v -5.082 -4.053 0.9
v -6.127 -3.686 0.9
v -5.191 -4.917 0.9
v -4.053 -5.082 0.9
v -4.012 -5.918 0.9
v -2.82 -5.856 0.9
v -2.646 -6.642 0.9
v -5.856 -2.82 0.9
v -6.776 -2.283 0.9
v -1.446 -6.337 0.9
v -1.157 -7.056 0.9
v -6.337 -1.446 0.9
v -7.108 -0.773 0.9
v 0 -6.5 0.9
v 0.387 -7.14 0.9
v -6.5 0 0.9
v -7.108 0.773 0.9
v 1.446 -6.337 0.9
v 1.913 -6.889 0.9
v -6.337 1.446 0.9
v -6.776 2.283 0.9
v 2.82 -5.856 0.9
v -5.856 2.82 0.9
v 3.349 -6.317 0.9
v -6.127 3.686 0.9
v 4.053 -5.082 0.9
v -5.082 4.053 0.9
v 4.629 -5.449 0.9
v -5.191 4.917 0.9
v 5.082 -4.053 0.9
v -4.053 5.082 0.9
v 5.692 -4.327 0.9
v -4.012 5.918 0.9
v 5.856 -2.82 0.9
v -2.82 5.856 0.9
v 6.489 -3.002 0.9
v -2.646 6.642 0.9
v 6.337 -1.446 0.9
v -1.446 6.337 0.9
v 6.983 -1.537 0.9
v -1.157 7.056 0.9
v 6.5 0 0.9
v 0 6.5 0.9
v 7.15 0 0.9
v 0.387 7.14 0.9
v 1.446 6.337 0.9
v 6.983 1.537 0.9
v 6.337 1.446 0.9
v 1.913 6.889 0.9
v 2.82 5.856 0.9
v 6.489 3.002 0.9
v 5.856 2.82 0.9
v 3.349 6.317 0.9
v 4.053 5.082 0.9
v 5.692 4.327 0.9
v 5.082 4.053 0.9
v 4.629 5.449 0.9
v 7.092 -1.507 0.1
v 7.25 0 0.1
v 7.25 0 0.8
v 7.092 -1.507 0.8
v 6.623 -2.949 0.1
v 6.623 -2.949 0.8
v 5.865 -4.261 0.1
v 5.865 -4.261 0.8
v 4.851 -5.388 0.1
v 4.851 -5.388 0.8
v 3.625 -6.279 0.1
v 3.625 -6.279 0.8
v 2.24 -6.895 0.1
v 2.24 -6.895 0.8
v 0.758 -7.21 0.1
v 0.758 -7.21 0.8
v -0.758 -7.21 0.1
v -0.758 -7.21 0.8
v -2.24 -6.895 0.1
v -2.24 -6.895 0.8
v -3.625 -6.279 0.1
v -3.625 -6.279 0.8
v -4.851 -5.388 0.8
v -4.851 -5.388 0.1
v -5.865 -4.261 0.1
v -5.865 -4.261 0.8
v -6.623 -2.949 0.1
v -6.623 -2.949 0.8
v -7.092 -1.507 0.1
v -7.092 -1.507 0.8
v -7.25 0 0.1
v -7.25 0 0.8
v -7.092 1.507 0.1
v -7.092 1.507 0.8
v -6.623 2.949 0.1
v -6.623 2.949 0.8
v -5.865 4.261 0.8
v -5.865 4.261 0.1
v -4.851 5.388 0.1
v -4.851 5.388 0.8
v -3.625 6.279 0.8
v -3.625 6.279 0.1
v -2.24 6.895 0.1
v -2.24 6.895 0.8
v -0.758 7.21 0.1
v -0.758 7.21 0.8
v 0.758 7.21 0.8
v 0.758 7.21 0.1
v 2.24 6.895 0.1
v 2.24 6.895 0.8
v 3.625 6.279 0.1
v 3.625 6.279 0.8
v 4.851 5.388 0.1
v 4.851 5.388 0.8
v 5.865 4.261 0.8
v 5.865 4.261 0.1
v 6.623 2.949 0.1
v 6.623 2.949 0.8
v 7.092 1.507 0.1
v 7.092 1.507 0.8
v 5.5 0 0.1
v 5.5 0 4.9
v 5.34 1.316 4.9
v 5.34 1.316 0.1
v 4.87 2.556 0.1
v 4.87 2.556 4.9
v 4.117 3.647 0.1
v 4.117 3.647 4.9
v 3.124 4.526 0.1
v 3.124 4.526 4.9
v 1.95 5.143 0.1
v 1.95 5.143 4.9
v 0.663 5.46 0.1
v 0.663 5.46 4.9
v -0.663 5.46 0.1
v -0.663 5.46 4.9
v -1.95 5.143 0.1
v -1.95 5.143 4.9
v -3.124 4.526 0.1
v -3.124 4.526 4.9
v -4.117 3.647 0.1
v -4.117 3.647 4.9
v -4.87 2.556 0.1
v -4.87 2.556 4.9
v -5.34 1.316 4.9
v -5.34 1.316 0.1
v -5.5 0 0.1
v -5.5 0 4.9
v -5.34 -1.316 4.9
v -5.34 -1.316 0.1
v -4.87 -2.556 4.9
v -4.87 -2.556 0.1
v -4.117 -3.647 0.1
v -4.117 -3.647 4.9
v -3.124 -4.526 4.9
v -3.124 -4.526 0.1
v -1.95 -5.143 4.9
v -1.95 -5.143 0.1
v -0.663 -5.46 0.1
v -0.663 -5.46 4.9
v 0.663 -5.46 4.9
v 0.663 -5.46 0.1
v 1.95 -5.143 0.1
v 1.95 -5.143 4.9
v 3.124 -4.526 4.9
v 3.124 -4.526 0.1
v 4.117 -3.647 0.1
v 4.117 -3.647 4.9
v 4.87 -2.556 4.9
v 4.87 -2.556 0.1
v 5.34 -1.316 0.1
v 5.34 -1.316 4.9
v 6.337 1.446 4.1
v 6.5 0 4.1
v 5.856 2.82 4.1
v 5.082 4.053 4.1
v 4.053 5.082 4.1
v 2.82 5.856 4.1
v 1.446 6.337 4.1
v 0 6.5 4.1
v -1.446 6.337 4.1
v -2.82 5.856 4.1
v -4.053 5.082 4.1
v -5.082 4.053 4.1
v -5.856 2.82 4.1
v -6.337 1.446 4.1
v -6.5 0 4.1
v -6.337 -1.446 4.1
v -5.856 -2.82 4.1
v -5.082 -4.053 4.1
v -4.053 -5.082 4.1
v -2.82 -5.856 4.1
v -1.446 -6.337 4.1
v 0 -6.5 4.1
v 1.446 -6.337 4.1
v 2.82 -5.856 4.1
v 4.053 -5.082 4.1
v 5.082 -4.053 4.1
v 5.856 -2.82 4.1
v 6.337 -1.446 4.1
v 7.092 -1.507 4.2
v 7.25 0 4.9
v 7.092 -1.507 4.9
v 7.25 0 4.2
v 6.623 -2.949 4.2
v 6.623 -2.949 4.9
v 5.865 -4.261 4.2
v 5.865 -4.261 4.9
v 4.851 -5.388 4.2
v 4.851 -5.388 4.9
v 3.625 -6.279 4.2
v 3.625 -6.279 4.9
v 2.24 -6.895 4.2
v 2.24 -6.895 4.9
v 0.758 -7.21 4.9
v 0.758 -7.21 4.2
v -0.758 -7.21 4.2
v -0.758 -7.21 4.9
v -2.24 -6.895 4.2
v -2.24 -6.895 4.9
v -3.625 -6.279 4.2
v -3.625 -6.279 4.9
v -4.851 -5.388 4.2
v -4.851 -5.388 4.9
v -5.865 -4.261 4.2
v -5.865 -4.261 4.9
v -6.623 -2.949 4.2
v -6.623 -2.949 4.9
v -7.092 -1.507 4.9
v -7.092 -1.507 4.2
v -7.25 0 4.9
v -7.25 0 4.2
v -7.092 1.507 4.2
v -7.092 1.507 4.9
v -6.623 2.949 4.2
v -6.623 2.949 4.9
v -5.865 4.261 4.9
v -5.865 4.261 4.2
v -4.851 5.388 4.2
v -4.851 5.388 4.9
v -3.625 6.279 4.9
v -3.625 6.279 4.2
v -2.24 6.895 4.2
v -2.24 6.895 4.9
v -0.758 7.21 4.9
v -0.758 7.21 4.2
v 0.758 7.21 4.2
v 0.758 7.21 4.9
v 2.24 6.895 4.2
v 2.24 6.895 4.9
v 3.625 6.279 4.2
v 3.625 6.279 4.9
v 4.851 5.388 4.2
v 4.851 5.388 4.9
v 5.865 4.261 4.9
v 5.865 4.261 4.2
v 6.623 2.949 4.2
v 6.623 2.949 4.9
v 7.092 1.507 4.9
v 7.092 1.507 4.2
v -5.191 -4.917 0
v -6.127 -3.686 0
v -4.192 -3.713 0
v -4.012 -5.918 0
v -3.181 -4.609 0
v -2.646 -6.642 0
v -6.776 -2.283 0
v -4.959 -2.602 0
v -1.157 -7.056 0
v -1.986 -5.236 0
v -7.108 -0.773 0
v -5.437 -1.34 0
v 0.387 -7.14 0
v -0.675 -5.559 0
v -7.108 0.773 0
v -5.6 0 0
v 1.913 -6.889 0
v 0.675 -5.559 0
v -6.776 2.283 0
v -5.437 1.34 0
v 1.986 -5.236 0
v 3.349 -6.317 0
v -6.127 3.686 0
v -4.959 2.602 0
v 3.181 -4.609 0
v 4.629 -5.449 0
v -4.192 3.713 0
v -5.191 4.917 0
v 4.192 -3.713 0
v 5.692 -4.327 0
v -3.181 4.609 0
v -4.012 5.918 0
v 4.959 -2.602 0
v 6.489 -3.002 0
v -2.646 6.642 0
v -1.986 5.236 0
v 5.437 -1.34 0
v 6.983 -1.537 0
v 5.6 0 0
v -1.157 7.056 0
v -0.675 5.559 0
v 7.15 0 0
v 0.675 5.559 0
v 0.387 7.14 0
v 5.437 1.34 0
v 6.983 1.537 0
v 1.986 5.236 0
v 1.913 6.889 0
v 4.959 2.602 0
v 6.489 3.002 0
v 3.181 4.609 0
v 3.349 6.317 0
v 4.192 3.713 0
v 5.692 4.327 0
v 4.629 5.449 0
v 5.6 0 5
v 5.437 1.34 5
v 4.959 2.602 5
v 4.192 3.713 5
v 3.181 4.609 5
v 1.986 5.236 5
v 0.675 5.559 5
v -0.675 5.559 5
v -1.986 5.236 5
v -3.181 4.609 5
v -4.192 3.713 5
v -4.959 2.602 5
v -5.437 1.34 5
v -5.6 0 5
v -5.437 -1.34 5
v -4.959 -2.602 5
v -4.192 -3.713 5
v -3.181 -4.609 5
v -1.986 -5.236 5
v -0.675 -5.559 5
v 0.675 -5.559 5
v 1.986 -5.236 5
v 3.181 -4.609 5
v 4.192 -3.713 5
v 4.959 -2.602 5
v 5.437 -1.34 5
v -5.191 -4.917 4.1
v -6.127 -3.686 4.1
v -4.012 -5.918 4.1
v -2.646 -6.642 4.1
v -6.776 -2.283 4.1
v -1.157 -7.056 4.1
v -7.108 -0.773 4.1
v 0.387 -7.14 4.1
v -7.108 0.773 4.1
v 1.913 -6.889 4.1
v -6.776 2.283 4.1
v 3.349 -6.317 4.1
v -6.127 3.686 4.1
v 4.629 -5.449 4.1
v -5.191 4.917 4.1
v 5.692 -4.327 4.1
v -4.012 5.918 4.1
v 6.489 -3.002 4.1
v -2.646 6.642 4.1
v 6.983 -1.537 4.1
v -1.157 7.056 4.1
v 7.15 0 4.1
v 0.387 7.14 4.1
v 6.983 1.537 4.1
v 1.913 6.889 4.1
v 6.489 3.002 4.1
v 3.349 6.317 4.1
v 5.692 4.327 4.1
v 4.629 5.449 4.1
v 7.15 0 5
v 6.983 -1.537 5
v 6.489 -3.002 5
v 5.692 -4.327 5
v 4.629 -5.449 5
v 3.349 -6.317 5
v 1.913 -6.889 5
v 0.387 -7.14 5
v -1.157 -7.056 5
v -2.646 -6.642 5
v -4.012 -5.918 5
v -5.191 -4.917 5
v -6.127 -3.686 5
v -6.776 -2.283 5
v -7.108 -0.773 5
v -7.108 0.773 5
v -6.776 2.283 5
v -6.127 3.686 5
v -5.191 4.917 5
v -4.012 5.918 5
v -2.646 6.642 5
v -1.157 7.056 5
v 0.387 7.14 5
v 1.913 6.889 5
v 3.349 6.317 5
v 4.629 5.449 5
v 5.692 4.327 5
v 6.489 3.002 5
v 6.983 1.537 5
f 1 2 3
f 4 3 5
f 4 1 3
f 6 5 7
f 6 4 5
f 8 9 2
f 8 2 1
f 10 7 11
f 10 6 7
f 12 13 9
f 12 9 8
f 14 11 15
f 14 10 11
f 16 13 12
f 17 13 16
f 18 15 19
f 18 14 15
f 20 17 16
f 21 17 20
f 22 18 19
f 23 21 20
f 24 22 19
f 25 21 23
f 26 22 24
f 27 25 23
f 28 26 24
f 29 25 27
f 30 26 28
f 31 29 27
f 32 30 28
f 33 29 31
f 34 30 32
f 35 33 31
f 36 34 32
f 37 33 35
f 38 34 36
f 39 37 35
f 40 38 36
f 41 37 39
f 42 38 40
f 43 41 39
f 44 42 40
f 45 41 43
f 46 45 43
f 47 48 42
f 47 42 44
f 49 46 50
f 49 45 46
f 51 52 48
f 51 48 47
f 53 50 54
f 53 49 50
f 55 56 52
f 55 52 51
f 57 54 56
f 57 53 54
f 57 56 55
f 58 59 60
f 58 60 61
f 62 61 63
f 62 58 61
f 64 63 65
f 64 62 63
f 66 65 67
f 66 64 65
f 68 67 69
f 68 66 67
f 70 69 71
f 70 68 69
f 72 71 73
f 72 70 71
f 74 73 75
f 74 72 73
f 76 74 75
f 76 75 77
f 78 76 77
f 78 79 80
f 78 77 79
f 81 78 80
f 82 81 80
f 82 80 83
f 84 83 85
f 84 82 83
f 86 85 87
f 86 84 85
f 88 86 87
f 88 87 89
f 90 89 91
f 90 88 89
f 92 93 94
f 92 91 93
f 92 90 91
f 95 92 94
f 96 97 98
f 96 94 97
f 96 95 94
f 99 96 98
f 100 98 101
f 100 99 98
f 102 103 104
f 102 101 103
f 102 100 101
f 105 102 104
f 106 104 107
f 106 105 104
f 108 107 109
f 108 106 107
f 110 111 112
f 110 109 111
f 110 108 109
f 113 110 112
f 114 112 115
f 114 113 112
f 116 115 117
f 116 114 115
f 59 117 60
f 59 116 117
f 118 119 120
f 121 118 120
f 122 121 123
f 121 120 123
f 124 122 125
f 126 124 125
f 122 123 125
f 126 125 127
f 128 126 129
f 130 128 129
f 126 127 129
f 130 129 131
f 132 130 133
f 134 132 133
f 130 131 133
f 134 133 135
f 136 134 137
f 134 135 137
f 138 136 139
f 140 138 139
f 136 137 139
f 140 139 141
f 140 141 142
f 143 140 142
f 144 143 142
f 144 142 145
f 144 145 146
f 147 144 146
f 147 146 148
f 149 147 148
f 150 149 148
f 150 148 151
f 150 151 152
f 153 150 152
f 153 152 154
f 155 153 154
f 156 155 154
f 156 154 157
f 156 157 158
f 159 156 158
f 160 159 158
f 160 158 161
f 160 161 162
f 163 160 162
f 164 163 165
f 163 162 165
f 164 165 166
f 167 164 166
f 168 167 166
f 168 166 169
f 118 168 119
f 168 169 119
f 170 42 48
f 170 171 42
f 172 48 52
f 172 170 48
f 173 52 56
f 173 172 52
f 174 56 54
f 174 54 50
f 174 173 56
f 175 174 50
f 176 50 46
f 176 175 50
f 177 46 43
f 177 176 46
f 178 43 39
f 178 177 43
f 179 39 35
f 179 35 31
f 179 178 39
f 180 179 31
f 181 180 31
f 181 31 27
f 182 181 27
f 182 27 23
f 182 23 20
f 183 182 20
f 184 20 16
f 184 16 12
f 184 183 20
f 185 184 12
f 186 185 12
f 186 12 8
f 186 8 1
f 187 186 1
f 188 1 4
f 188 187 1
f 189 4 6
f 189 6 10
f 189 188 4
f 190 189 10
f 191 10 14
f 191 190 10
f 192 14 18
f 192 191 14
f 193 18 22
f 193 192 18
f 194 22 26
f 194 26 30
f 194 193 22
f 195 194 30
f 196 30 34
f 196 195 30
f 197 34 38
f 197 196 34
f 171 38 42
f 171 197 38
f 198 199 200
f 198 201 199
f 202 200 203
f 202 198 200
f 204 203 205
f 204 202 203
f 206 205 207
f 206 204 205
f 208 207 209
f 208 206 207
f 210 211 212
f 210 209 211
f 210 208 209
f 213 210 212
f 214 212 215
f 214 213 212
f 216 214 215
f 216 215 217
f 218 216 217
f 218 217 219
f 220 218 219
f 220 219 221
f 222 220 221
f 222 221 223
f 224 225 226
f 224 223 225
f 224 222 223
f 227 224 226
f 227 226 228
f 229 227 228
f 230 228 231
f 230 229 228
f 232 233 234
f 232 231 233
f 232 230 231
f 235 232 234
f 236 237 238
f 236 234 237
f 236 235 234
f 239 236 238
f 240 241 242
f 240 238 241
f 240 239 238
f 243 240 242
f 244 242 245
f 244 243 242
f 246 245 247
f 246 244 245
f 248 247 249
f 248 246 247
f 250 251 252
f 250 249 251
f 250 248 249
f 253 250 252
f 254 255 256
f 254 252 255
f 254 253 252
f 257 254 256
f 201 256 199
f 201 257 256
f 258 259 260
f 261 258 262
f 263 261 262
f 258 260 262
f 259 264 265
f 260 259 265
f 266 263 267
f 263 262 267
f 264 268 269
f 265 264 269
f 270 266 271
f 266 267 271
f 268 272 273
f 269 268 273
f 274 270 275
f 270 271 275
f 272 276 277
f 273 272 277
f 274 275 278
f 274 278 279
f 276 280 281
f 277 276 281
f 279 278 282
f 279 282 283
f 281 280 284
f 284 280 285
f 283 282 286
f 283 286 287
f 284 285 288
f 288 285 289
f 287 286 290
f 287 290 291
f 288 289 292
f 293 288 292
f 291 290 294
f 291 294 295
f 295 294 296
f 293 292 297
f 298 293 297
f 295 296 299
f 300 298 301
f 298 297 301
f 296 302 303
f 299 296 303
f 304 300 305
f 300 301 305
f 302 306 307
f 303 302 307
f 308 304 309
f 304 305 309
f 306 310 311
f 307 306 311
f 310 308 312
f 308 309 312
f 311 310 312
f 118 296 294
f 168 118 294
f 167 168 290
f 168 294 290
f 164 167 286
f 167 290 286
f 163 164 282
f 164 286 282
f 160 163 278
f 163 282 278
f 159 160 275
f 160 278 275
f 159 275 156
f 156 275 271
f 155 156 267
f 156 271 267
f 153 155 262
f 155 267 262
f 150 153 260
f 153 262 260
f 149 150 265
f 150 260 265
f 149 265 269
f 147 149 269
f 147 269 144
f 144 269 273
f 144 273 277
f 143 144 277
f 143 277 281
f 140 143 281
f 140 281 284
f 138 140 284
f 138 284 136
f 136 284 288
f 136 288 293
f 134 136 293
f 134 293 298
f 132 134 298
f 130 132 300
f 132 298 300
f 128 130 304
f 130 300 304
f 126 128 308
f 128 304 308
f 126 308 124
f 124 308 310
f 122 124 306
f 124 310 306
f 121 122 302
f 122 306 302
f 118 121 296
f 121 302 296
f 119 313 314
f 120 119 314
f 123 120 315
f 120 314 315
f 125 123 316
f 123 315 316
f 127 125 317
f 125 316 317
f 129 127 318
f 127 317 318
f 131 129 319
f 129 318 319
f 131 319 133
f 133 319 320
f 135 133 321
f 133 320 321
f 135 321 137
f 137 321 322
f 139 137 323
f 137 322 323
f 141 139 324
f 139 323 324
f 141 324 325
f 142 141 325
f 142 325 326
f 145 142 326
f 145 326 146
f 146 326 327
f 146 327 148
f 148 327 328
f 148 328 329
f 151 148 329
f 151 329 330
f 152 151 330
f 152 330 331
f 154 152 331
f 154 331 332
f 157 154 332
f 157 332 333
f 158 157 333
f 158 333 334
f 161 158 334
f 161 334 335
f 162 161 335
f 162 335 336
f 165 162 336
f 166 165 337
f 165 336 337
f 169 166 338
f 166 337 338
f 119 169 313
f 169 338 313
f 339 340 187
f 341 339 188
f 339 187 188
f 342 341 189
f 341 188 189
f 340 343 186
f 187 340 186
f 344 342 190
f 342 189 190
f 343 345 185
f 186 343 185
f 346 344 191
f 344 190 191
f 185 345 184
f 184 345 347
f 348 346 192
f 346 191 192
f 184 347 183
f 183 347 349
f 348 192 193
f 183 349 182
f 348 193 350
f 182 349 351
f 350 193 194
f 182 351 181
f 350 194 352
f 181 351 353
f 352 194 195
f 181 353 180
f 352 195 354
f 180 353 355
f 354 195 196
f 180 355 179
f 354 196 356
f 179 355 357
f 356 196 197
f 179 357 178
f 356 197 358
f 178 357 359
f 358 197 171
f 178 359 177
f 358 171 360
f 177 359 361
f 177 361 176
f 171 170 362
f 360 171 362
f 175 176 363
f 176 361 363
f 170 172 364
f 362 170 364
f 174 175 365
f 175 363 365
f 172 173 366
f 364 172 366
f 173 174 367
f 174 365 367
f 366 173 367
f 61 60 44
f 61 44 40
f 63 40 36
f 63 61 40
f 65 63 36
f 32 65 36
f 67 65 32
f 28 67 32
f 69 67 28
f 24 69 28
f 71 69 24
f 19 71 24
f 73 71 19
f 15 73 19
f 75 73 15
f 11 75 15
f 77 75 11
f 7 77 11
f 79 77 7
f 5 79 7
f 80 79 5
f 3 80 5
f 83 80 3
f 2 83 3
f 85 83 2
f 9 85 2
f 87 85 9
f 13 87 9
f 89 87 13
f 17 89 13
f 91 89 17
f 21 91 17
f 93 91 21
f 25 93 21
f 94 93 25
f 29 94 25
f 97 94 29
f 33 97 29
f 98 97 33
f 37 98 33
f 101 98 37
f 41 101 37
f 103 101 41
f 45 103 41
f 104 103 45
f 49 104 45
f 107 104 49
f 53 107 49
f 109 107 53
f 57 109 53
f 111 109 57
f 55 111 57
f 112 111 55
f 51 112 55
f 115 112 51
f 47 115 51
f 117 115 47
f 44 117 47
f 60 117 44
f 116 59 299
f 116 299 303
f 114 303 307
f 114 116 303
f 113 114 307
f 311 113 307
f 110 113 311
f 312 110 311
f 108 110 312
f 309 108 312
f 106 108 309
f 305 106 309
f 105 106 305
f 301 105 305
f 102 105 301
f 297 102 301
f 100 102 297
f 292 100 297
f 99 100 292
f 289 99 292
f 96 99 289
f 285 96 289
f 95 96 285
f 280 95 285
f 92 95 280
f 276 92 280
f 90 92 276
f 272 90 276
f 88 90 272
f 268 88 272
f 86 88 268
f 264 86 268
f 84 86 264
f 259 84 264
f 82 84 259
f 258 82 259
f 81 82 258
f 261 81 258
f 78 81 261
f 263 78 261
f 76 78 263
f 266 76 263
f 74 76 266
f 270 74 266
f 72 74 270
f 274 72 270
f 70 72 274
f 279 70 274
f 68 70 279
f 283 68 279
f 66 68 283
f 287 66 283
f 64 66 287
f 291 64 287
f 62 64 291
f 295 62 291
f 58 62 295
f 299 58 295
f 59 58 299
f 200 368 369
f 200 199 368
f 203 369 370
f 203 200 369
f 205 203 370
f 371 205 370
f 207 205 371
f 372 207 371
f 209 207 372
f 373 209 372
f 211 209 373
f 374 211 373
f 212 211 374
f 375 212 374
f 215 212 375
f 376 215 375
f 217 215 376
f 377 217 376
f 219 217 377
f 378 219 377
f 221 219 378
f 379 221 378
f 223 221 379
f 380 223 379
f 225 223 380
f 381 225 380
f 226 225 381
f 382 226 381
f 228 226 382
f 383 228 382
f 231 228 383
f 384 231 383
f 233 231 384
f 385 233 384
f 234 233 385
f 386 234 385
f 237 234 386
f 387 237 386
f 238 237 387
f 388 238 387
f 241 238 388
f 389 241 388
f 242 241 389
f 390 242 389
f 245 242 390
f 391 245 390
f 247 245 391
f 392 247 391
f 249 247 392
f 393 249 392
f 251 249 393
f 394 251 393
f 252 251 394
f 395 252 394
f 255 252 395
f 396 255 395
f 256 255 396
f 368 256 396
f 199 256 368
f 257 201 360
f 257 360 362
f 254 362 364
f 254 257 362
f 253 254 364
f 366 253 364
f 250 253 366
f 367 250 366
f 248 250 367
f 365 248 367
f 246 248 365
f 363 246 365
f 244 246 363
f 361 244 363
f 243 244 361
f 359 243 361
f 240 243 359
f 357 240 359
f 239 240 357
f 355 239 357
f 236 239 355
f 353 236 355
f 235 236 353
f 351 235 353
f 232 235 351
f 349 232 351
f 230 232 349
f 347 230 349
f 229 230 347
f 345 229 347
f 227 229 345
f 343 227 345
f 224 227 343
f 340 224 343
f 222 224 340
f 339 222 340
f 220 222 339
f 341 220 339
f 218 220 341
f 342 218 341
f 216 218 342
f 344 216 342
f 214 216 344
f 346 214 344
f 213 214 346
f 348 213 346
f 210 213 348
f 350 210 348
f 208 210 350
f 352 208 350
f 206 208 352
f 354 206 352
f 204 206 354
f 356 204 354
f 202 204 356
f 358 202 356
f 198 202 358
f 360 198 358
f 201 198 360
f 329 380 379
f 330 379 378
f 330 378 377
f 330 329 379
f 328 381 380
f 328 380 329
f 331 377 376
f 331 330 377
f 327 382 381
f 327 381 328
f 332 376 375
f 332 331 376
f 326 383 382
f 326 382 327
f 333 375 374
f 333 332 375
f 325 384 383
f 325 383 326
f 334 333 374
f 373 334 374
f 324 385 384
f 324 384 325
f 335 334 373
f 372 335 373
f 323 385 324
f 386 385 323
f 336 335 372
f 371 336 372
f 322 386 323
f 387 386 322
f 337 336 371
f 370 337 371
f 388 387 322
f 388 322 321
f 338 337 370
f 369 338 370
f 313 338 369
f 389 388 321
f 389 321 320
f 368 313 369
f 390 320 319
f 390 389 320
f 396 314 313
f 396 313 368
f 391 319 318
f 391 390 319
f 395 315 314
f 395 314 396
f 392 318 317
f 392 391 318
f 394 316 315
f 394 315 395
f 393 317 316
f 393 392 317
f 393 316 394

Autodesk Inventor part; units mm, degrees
ref_plane "YZ Plane" through (0, 0, 0) normal (1, 0, 0) x (0, 1, 0)
ref_plane "XZ Plane" through (0, 0, 0) normal (0, 1, 0) x (-1, 0, 0)
sketch "Sketch1" plane through (0, 0, 0) normal (0, 0, 1) x (1, 0, 0)
  circle A0 centre (0, 0) radius 7.25
  dimension "d0" = 14.5
extrude "Extrusion1" add sketch "Sketch1" along normal blind 5
sketch "Sketch2" plane through (0, 0, 5) normal (0, 0, 1) x (1, 0, 0)
  circle A0 centre (0, 0) radius 5.5
  dimension "d3" = 11
extrude "Extrusion2" cut sketch "Sketch2" against normal through all
ref_plane "Work Plane1" through (0, 0, 2.5) normal (0, 0, 1) x (1, 0, 0)
sketch "Sketch3" plane through (0, 0, 2.5) normal (0, 0, 1) x (1, 0, 0)
  circle A0 centre (0, 0) radius 5.5 projected
  circle A1 centre (0, 0) radius 6.5
  circle A2 centre (0, 0) radius 7.25 projected
  dimension "d6" = 13
extrude "Extrusion3" cut sketch "Sketch3" along normal mid plane 3.2 contours A2
chamfer "Chamfer1" distance 0.1 angle 45 6 edges at (-7.25, 0, 4.1) (-7.25, 0, 0.9) (-7.25, 0, 0) (-7.25, 0, 5) (-5.5, 0, 0) (-5.5, 0, 5)
properties part number "roller" material "Aluminum 3004-H38"
